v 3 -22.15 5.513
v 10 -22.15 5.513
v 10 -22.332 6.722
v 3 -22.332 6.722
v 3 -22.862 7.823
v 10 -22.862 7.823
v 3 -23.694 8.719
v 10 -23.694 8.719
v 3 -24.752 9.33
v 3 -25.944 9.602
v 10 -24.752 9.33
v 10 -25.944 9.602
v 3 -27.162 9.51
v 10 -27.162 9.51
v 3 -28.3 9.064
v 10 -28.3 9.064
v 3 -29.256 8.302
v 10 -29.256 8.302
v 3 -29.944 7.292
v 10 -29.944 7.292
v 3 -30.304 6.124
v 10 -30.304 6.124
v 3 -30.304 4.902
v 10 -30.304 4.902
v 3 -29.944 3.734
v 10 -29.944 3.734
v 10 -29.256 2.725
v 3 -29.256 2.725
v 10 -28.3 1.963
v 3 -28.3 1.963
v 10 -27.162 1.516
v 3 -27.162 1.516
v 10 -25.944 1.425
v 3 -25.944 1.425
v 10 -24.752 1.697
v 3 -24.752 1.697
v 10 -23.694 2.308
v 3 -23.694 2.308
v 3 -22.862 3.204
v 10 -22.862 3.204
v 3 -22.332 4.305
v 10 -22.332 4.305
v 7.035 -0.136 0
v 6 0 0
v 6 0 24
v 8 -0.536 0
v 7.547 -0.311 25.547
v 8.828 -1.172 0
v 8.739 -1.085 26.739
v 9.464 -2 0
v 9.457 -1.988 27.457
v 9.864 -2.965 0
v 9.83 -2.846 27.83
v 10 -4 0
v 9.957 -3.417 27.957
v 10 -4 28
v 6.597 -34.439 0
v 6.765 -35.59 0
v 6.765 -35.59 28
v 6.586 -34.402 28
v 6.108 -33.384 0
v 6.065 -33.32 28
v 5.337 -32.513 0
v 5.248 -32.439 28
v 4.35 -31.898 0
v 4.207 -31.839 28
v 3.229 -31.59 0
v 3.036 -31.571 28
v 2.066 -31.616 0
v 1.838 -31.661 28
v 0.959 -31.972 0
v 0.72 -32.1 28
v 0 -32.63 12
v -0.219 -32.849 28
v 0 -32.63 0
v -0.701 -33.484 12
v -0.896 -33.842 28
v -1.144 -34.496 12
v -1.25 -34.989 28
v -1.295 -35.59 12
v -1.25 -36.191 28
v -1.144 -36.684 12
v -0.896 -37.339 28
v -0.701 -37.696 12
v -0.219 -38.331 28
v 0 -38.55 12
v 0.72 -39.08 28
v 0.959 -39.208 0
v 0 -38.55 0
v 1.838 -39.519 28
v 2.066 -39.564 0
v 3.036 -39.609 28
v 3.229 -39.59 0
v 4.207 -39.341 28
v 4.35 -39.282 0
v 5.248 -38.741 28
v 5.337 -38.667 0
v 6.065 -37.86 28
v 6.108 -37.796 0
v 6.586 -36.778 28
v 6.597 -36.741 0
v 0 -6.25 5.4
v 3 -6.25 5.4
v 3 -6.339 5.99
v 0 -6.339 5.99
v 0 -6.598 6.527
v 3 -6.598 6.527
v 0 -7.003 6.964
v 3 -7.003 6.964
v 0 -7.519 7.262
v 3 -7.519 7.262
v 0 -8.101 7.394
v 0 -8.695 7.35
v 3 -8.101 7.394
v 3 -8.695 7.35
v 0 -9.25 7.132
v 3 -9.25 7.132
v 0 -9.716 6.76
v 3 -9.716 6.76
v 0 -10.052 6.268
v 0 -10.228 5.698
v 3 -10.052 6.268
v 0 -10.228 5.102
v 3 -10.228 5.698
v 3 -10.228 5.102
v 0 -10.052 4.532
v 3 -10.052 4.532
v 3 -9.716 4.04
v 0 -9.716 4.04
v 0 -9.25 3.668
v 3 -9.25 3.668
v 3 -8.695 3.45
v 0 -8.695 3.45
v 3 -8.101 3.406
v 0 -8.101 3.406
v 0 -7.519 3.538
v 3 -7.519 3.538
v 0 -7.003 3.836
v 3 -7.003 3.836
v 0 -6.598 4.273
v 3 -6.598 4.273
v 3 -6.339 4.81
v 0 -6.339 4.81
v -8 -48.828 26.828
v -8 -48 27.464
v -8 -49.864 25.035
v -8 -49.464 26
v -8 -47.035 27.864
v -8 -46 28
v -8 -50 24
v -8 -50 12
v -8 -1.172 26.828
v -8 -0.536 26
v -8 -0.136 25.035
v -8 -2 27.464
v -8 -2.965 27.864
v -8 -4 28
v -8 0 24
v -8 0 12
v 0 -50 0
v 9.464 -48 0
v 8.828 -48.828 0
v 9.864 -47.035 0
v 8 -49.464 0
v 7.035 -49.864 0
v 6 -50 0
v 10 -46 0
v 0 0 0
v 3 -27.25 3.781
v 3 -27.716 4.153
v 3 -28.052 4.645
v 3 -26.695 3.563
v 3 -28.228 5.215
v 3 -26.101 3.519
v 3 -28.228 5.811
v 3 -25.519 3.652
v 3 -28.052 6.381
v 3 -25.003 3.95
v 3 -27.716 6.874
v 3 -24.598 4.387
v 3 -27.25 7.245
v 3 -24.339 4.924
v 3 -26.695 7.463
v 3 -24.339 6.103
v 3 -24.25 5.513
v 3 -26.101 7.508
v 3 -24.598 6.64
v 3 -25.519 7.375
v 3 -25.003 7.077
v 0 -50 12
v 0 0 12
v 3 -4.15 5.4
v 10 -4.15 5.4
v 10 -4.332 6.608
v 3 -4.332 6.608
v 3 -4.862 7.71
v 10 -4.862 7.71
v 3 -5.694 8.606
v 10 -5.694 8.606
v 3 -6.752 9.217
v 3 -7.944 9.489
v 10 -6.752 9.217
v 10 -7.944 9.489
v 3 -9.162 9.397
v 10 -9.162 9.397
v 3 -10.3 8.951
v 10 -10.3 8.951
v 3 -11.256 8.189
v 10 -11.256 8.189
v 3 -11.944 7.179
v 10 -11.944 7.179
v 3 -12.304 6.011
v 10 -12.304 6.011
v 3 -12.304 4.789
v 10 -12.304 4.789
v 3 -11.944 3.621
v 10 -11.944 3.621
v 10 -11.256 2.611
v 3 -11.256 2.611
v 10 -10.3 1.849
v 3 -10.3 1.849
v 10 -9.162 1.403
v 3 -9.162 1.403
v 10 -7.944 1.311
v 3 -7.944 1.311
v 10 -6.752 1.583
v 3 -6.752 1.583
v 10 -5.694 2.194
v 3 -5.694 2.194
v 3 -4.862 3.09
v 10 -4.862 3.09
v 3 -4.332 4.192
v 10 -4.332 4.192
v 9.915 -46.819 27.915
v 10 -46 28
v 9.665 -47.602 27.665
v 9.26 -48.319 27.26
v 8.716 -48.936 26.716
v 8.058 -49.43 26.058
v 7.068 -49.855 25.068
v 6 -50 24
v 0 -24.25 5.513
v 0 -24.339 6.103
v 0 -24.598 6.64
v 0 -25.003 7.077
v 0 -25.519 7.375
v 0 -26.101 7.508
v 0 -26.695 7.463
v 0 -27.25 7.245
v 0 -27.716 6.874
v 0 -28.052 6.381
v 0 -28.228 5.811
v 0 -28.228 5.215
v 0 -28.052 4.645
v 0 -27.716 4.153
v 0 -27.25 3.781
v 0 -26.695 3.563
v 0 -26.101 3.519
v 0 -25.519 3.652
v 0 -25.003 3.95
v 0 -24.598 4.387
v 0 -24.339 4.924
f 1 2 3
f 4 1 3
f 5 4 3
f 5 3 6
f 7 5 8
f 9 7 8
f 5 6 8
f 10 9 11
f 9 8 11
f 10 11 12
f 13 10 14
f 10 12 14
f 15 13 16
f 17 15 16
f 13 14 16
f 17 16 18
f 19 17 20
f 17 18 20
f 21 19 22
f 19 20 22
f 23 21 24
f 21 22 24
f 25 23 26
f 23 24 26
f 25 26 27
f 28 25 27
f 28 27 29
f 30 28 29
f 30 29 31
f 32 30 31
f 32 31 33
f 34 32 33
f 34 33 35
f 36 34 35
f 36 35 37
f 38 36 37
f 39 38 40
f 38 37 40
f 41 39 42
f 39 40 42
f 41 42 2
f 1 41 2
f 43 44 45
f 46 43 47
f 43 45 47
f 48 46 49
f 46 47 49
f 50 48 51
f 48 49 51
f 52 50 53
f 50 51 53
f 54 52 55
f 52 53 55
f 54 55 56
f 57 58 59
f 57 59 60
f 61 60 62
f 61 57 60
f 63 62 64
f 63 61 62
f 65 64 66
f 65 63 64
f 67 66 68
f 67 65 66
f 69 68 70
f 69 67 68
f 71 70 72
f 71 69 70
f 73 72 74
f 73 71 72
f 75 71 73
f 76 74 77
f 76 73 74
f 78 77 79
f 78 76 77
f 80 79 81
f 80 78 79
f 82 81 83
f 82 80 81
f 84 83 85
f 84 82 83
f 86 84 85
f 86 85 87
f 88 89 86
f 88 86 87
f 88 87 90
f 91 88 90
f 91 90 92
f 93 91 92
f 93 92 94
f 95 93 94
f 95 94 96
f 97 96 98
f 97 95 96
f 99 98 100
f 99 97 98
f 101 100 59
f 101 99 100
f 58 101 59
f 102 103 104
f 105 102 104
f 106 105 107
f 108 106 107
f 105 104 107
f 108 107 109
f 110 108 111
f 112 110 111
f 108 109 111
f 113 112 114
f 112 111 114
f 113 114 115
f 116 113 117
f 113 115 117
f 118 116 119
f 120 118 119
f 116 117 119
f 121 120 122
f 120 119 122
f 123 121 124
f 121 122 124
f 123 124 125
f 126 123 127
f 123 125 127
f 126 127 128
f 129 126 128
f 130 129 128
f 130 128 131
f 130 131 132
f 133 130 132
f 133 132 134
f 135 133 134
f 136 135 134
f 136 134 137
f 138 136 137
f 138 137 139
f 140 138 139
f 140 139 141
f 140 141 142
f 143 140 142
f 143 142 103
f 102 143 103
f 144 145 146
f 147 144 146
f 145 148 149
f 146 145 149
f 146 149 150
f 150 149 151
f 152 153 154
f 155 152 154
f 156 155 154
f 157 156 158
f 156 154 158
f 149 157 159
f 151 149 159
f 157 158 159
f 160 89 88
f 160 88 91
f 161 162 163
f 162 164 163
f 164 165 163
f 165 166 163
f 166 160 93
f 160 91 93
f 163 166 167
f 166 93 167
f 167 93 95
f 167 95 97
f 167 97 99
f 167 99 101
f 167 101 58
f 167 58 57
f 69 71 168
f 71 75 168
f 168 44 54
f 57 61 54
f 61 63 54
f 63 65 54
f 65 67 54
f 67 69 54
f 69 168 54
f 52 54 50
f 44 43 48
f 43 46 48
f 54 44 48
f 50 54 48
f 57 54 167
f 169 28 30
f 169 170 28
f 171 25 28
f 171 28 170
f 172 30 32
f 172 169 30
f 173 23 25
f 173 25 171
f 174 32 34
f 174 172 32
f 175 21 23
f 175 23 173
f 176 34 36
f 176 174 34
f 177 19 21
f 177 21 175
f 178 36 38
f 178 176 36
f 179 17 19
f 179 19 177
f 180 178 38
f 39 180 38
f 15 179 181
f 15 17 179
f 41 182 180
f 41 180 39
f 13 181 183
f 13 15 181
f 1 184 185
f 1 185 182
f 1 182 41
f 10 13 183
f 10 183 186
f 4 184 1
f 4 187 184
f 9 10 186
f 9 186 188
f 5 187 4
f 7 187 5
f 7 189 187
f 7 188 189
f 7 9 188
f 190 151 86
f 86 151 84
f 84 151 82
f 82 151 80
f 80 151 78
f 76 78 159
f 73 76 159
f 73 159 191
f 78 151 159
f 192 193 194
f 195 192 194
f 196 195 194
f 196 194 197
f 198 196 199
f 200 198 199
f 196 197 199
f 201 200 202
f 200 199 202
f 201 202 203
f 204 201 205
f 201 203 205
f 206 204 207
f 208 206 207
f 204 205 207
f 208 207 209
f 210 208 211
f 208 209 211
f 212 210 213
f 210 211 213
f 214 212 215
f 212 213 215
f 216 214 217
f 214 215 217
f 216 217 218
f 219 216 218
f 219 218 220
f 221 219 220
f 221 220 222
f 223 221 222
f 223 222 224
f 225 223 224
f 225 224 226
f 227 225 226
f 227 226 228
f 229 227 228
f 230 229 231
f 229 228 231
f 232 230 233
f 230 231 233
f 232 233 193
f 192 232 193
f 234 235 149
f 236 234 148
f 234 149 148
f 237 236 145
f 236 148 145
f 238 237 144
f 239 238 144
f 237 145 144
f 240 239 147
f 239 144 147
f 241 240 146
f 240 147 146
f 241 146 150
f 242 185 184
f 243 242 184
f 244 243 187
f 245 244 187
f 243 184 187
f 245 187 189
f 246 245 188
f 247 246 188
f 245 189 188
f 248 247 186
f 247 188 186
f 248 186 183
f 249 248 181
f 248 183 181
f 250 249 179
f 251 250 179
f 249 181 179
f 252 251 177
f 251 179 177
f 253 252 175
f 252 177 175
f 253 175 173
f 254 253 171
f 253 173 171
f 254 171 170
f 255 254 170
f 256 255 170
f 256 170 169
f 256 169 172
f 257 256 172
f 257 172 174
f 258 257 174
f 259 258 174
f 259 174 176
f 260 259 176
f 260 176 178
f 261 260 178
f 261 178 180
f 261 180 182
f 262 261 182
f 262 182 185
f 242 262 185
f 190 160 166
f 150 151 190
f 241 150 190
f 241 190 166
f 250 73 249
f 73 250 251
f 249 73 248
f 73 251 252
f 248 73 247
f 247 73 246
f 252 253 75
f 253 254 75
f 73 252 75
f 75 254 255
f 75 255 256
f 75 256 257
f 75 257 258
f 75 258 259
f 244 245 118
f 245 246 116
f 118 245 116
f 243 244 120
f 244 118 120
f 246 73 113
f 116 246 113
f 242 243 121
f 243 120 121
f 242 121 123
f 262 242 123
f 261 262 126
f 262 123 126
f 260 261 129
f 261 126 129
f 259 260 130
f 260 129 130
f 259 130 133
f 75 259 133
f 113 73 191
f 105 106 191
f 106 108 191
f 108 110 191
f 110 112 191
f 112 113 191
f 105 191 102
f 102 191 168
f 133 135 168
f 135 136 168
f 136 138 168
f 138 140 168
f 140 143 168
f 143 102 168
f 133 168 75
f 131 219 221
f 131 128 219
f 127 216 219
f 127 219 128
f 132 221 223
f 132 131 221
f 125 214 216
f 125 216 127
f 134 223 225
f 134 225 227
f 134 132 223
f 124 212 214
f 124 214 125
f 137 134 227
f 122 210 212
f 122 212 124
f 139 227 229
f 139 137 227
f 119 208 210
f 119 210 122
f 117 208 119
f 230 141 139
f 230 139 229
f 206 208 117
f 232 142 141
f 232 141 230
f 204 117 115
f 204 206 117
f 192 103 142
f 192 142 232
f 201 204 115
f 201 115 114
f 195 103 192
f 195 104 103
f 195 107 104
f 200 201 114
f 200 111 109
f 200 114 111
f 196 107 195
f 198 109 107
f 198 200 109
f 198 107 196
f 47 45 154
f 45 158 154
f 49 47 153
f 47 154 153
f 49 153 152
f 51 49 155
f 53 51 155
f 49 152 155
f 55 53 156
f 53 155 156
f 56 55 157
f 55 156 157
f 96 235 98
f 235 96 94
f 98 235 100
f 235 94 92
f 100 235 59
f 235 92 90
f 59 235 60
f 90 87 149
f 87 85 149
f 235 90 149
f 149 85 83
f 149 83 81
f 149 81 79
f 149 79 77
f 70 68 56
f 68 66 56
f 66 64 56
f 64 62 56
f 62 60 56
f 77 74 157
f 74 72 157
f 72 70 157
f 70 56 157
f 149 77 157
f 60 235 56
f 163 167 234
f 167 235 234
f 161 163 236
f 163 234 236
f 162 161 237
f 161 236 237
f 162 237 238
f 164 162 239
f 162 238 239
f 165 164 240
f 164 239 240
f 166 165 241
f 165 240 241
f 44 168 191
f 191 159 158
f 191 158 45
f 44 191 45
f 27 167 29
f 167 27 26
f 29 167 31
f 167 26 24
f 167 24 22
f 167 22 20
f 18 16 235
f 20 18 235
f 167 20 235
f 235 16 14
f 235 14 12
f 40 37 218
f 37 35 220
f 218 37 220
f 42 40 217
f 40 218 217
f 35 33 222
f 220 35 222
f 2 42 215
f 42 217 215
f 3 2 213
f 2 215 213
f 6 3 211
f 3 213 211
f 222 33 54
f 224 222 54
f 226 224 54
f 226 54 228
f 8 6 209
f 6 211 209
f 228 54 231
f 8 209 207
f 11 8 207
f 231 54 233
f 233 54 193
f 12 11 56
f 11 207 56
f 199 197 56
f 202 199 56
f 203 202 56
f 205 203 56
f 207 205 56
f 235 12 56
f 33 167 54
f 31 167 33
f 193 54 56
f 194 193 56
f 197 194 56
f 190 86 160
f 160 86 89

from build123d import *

# Parameters (mm, degrees)
F1_DEPTH      = 50
F2_R          = 2
F3_DEPTH      = 25
F4_R          = 4.03
F5_DEPTH      = 28.8
F5_DEPTH_BACK = 25
F2_R_2        = 4.1
F6_DEPTH      = 7
F7_R          = 4


with BuildPart() as f1:
    # F0 (on Front) → F1 (new body)
    with BuildSketch(Plane.XZ):
        Polygon((0, 12), (0, 0), (10, 0), (10, 28), (-8, 28), (-8, 12), align=None)
    extrude(amount=F1_DEPTH)

    # F2 (on face) → F3 (cut)
    with BuildSketch(Plane.YZ.offset(10)):
        with Locations((-26.25, 5.513248)):
            Circle(F2_R)
        with Locations((-8.25, 5.4)):
            Circle(F2_R)
    extrude(amount=-F3_DEPTH, mode=Mode.SUBTRACT)

    # F4 (on Top) → F5 (cut, two sides)
    with BuildSketch(Plane.XY) as f5_sk:
        with Locations((2.73504, -35.590066)):
            Circle(F4_R)
    extrude(amount=F5_DEPTH, mode=Mode.SUBTRACT)
    extrude(f5_sk.sketch, amount=-F5_DEPTH_BACK, mode=Mode.SUBTRACT)

    # F2 (on face) → F6 (cut, symmetric)
    with BuildSketch(Plane.YZ.offset(10)):
        with Locations((-26.25, 5.513248)):
            Circle(F2_R_2)
        with Locations((-26.25, 5.513248)):
            Circle(F2_R, mode=Mode.SUBTRACT)
        with Locations((-8.25, 5.4)):
            Circle(F2_R_2)
        with Locations((-8.25, 5.4)):
            Circle(F2_R, mode=Mode.SUBTRACT)
    extrude(amount=F6_DEPTH, both=True, mode=Mode.SUBTRACT)

    # F7
    f7_edges = [f1.edges().sort_by_distance(p)[0] for p in [
        (1, -50, 28),
        (1, 0, 28),
        (10, -50, 14),
        (10, 0, 14),
    ]]
    fillet(f7_edges, radius=F7_R)


solid = f1.part
